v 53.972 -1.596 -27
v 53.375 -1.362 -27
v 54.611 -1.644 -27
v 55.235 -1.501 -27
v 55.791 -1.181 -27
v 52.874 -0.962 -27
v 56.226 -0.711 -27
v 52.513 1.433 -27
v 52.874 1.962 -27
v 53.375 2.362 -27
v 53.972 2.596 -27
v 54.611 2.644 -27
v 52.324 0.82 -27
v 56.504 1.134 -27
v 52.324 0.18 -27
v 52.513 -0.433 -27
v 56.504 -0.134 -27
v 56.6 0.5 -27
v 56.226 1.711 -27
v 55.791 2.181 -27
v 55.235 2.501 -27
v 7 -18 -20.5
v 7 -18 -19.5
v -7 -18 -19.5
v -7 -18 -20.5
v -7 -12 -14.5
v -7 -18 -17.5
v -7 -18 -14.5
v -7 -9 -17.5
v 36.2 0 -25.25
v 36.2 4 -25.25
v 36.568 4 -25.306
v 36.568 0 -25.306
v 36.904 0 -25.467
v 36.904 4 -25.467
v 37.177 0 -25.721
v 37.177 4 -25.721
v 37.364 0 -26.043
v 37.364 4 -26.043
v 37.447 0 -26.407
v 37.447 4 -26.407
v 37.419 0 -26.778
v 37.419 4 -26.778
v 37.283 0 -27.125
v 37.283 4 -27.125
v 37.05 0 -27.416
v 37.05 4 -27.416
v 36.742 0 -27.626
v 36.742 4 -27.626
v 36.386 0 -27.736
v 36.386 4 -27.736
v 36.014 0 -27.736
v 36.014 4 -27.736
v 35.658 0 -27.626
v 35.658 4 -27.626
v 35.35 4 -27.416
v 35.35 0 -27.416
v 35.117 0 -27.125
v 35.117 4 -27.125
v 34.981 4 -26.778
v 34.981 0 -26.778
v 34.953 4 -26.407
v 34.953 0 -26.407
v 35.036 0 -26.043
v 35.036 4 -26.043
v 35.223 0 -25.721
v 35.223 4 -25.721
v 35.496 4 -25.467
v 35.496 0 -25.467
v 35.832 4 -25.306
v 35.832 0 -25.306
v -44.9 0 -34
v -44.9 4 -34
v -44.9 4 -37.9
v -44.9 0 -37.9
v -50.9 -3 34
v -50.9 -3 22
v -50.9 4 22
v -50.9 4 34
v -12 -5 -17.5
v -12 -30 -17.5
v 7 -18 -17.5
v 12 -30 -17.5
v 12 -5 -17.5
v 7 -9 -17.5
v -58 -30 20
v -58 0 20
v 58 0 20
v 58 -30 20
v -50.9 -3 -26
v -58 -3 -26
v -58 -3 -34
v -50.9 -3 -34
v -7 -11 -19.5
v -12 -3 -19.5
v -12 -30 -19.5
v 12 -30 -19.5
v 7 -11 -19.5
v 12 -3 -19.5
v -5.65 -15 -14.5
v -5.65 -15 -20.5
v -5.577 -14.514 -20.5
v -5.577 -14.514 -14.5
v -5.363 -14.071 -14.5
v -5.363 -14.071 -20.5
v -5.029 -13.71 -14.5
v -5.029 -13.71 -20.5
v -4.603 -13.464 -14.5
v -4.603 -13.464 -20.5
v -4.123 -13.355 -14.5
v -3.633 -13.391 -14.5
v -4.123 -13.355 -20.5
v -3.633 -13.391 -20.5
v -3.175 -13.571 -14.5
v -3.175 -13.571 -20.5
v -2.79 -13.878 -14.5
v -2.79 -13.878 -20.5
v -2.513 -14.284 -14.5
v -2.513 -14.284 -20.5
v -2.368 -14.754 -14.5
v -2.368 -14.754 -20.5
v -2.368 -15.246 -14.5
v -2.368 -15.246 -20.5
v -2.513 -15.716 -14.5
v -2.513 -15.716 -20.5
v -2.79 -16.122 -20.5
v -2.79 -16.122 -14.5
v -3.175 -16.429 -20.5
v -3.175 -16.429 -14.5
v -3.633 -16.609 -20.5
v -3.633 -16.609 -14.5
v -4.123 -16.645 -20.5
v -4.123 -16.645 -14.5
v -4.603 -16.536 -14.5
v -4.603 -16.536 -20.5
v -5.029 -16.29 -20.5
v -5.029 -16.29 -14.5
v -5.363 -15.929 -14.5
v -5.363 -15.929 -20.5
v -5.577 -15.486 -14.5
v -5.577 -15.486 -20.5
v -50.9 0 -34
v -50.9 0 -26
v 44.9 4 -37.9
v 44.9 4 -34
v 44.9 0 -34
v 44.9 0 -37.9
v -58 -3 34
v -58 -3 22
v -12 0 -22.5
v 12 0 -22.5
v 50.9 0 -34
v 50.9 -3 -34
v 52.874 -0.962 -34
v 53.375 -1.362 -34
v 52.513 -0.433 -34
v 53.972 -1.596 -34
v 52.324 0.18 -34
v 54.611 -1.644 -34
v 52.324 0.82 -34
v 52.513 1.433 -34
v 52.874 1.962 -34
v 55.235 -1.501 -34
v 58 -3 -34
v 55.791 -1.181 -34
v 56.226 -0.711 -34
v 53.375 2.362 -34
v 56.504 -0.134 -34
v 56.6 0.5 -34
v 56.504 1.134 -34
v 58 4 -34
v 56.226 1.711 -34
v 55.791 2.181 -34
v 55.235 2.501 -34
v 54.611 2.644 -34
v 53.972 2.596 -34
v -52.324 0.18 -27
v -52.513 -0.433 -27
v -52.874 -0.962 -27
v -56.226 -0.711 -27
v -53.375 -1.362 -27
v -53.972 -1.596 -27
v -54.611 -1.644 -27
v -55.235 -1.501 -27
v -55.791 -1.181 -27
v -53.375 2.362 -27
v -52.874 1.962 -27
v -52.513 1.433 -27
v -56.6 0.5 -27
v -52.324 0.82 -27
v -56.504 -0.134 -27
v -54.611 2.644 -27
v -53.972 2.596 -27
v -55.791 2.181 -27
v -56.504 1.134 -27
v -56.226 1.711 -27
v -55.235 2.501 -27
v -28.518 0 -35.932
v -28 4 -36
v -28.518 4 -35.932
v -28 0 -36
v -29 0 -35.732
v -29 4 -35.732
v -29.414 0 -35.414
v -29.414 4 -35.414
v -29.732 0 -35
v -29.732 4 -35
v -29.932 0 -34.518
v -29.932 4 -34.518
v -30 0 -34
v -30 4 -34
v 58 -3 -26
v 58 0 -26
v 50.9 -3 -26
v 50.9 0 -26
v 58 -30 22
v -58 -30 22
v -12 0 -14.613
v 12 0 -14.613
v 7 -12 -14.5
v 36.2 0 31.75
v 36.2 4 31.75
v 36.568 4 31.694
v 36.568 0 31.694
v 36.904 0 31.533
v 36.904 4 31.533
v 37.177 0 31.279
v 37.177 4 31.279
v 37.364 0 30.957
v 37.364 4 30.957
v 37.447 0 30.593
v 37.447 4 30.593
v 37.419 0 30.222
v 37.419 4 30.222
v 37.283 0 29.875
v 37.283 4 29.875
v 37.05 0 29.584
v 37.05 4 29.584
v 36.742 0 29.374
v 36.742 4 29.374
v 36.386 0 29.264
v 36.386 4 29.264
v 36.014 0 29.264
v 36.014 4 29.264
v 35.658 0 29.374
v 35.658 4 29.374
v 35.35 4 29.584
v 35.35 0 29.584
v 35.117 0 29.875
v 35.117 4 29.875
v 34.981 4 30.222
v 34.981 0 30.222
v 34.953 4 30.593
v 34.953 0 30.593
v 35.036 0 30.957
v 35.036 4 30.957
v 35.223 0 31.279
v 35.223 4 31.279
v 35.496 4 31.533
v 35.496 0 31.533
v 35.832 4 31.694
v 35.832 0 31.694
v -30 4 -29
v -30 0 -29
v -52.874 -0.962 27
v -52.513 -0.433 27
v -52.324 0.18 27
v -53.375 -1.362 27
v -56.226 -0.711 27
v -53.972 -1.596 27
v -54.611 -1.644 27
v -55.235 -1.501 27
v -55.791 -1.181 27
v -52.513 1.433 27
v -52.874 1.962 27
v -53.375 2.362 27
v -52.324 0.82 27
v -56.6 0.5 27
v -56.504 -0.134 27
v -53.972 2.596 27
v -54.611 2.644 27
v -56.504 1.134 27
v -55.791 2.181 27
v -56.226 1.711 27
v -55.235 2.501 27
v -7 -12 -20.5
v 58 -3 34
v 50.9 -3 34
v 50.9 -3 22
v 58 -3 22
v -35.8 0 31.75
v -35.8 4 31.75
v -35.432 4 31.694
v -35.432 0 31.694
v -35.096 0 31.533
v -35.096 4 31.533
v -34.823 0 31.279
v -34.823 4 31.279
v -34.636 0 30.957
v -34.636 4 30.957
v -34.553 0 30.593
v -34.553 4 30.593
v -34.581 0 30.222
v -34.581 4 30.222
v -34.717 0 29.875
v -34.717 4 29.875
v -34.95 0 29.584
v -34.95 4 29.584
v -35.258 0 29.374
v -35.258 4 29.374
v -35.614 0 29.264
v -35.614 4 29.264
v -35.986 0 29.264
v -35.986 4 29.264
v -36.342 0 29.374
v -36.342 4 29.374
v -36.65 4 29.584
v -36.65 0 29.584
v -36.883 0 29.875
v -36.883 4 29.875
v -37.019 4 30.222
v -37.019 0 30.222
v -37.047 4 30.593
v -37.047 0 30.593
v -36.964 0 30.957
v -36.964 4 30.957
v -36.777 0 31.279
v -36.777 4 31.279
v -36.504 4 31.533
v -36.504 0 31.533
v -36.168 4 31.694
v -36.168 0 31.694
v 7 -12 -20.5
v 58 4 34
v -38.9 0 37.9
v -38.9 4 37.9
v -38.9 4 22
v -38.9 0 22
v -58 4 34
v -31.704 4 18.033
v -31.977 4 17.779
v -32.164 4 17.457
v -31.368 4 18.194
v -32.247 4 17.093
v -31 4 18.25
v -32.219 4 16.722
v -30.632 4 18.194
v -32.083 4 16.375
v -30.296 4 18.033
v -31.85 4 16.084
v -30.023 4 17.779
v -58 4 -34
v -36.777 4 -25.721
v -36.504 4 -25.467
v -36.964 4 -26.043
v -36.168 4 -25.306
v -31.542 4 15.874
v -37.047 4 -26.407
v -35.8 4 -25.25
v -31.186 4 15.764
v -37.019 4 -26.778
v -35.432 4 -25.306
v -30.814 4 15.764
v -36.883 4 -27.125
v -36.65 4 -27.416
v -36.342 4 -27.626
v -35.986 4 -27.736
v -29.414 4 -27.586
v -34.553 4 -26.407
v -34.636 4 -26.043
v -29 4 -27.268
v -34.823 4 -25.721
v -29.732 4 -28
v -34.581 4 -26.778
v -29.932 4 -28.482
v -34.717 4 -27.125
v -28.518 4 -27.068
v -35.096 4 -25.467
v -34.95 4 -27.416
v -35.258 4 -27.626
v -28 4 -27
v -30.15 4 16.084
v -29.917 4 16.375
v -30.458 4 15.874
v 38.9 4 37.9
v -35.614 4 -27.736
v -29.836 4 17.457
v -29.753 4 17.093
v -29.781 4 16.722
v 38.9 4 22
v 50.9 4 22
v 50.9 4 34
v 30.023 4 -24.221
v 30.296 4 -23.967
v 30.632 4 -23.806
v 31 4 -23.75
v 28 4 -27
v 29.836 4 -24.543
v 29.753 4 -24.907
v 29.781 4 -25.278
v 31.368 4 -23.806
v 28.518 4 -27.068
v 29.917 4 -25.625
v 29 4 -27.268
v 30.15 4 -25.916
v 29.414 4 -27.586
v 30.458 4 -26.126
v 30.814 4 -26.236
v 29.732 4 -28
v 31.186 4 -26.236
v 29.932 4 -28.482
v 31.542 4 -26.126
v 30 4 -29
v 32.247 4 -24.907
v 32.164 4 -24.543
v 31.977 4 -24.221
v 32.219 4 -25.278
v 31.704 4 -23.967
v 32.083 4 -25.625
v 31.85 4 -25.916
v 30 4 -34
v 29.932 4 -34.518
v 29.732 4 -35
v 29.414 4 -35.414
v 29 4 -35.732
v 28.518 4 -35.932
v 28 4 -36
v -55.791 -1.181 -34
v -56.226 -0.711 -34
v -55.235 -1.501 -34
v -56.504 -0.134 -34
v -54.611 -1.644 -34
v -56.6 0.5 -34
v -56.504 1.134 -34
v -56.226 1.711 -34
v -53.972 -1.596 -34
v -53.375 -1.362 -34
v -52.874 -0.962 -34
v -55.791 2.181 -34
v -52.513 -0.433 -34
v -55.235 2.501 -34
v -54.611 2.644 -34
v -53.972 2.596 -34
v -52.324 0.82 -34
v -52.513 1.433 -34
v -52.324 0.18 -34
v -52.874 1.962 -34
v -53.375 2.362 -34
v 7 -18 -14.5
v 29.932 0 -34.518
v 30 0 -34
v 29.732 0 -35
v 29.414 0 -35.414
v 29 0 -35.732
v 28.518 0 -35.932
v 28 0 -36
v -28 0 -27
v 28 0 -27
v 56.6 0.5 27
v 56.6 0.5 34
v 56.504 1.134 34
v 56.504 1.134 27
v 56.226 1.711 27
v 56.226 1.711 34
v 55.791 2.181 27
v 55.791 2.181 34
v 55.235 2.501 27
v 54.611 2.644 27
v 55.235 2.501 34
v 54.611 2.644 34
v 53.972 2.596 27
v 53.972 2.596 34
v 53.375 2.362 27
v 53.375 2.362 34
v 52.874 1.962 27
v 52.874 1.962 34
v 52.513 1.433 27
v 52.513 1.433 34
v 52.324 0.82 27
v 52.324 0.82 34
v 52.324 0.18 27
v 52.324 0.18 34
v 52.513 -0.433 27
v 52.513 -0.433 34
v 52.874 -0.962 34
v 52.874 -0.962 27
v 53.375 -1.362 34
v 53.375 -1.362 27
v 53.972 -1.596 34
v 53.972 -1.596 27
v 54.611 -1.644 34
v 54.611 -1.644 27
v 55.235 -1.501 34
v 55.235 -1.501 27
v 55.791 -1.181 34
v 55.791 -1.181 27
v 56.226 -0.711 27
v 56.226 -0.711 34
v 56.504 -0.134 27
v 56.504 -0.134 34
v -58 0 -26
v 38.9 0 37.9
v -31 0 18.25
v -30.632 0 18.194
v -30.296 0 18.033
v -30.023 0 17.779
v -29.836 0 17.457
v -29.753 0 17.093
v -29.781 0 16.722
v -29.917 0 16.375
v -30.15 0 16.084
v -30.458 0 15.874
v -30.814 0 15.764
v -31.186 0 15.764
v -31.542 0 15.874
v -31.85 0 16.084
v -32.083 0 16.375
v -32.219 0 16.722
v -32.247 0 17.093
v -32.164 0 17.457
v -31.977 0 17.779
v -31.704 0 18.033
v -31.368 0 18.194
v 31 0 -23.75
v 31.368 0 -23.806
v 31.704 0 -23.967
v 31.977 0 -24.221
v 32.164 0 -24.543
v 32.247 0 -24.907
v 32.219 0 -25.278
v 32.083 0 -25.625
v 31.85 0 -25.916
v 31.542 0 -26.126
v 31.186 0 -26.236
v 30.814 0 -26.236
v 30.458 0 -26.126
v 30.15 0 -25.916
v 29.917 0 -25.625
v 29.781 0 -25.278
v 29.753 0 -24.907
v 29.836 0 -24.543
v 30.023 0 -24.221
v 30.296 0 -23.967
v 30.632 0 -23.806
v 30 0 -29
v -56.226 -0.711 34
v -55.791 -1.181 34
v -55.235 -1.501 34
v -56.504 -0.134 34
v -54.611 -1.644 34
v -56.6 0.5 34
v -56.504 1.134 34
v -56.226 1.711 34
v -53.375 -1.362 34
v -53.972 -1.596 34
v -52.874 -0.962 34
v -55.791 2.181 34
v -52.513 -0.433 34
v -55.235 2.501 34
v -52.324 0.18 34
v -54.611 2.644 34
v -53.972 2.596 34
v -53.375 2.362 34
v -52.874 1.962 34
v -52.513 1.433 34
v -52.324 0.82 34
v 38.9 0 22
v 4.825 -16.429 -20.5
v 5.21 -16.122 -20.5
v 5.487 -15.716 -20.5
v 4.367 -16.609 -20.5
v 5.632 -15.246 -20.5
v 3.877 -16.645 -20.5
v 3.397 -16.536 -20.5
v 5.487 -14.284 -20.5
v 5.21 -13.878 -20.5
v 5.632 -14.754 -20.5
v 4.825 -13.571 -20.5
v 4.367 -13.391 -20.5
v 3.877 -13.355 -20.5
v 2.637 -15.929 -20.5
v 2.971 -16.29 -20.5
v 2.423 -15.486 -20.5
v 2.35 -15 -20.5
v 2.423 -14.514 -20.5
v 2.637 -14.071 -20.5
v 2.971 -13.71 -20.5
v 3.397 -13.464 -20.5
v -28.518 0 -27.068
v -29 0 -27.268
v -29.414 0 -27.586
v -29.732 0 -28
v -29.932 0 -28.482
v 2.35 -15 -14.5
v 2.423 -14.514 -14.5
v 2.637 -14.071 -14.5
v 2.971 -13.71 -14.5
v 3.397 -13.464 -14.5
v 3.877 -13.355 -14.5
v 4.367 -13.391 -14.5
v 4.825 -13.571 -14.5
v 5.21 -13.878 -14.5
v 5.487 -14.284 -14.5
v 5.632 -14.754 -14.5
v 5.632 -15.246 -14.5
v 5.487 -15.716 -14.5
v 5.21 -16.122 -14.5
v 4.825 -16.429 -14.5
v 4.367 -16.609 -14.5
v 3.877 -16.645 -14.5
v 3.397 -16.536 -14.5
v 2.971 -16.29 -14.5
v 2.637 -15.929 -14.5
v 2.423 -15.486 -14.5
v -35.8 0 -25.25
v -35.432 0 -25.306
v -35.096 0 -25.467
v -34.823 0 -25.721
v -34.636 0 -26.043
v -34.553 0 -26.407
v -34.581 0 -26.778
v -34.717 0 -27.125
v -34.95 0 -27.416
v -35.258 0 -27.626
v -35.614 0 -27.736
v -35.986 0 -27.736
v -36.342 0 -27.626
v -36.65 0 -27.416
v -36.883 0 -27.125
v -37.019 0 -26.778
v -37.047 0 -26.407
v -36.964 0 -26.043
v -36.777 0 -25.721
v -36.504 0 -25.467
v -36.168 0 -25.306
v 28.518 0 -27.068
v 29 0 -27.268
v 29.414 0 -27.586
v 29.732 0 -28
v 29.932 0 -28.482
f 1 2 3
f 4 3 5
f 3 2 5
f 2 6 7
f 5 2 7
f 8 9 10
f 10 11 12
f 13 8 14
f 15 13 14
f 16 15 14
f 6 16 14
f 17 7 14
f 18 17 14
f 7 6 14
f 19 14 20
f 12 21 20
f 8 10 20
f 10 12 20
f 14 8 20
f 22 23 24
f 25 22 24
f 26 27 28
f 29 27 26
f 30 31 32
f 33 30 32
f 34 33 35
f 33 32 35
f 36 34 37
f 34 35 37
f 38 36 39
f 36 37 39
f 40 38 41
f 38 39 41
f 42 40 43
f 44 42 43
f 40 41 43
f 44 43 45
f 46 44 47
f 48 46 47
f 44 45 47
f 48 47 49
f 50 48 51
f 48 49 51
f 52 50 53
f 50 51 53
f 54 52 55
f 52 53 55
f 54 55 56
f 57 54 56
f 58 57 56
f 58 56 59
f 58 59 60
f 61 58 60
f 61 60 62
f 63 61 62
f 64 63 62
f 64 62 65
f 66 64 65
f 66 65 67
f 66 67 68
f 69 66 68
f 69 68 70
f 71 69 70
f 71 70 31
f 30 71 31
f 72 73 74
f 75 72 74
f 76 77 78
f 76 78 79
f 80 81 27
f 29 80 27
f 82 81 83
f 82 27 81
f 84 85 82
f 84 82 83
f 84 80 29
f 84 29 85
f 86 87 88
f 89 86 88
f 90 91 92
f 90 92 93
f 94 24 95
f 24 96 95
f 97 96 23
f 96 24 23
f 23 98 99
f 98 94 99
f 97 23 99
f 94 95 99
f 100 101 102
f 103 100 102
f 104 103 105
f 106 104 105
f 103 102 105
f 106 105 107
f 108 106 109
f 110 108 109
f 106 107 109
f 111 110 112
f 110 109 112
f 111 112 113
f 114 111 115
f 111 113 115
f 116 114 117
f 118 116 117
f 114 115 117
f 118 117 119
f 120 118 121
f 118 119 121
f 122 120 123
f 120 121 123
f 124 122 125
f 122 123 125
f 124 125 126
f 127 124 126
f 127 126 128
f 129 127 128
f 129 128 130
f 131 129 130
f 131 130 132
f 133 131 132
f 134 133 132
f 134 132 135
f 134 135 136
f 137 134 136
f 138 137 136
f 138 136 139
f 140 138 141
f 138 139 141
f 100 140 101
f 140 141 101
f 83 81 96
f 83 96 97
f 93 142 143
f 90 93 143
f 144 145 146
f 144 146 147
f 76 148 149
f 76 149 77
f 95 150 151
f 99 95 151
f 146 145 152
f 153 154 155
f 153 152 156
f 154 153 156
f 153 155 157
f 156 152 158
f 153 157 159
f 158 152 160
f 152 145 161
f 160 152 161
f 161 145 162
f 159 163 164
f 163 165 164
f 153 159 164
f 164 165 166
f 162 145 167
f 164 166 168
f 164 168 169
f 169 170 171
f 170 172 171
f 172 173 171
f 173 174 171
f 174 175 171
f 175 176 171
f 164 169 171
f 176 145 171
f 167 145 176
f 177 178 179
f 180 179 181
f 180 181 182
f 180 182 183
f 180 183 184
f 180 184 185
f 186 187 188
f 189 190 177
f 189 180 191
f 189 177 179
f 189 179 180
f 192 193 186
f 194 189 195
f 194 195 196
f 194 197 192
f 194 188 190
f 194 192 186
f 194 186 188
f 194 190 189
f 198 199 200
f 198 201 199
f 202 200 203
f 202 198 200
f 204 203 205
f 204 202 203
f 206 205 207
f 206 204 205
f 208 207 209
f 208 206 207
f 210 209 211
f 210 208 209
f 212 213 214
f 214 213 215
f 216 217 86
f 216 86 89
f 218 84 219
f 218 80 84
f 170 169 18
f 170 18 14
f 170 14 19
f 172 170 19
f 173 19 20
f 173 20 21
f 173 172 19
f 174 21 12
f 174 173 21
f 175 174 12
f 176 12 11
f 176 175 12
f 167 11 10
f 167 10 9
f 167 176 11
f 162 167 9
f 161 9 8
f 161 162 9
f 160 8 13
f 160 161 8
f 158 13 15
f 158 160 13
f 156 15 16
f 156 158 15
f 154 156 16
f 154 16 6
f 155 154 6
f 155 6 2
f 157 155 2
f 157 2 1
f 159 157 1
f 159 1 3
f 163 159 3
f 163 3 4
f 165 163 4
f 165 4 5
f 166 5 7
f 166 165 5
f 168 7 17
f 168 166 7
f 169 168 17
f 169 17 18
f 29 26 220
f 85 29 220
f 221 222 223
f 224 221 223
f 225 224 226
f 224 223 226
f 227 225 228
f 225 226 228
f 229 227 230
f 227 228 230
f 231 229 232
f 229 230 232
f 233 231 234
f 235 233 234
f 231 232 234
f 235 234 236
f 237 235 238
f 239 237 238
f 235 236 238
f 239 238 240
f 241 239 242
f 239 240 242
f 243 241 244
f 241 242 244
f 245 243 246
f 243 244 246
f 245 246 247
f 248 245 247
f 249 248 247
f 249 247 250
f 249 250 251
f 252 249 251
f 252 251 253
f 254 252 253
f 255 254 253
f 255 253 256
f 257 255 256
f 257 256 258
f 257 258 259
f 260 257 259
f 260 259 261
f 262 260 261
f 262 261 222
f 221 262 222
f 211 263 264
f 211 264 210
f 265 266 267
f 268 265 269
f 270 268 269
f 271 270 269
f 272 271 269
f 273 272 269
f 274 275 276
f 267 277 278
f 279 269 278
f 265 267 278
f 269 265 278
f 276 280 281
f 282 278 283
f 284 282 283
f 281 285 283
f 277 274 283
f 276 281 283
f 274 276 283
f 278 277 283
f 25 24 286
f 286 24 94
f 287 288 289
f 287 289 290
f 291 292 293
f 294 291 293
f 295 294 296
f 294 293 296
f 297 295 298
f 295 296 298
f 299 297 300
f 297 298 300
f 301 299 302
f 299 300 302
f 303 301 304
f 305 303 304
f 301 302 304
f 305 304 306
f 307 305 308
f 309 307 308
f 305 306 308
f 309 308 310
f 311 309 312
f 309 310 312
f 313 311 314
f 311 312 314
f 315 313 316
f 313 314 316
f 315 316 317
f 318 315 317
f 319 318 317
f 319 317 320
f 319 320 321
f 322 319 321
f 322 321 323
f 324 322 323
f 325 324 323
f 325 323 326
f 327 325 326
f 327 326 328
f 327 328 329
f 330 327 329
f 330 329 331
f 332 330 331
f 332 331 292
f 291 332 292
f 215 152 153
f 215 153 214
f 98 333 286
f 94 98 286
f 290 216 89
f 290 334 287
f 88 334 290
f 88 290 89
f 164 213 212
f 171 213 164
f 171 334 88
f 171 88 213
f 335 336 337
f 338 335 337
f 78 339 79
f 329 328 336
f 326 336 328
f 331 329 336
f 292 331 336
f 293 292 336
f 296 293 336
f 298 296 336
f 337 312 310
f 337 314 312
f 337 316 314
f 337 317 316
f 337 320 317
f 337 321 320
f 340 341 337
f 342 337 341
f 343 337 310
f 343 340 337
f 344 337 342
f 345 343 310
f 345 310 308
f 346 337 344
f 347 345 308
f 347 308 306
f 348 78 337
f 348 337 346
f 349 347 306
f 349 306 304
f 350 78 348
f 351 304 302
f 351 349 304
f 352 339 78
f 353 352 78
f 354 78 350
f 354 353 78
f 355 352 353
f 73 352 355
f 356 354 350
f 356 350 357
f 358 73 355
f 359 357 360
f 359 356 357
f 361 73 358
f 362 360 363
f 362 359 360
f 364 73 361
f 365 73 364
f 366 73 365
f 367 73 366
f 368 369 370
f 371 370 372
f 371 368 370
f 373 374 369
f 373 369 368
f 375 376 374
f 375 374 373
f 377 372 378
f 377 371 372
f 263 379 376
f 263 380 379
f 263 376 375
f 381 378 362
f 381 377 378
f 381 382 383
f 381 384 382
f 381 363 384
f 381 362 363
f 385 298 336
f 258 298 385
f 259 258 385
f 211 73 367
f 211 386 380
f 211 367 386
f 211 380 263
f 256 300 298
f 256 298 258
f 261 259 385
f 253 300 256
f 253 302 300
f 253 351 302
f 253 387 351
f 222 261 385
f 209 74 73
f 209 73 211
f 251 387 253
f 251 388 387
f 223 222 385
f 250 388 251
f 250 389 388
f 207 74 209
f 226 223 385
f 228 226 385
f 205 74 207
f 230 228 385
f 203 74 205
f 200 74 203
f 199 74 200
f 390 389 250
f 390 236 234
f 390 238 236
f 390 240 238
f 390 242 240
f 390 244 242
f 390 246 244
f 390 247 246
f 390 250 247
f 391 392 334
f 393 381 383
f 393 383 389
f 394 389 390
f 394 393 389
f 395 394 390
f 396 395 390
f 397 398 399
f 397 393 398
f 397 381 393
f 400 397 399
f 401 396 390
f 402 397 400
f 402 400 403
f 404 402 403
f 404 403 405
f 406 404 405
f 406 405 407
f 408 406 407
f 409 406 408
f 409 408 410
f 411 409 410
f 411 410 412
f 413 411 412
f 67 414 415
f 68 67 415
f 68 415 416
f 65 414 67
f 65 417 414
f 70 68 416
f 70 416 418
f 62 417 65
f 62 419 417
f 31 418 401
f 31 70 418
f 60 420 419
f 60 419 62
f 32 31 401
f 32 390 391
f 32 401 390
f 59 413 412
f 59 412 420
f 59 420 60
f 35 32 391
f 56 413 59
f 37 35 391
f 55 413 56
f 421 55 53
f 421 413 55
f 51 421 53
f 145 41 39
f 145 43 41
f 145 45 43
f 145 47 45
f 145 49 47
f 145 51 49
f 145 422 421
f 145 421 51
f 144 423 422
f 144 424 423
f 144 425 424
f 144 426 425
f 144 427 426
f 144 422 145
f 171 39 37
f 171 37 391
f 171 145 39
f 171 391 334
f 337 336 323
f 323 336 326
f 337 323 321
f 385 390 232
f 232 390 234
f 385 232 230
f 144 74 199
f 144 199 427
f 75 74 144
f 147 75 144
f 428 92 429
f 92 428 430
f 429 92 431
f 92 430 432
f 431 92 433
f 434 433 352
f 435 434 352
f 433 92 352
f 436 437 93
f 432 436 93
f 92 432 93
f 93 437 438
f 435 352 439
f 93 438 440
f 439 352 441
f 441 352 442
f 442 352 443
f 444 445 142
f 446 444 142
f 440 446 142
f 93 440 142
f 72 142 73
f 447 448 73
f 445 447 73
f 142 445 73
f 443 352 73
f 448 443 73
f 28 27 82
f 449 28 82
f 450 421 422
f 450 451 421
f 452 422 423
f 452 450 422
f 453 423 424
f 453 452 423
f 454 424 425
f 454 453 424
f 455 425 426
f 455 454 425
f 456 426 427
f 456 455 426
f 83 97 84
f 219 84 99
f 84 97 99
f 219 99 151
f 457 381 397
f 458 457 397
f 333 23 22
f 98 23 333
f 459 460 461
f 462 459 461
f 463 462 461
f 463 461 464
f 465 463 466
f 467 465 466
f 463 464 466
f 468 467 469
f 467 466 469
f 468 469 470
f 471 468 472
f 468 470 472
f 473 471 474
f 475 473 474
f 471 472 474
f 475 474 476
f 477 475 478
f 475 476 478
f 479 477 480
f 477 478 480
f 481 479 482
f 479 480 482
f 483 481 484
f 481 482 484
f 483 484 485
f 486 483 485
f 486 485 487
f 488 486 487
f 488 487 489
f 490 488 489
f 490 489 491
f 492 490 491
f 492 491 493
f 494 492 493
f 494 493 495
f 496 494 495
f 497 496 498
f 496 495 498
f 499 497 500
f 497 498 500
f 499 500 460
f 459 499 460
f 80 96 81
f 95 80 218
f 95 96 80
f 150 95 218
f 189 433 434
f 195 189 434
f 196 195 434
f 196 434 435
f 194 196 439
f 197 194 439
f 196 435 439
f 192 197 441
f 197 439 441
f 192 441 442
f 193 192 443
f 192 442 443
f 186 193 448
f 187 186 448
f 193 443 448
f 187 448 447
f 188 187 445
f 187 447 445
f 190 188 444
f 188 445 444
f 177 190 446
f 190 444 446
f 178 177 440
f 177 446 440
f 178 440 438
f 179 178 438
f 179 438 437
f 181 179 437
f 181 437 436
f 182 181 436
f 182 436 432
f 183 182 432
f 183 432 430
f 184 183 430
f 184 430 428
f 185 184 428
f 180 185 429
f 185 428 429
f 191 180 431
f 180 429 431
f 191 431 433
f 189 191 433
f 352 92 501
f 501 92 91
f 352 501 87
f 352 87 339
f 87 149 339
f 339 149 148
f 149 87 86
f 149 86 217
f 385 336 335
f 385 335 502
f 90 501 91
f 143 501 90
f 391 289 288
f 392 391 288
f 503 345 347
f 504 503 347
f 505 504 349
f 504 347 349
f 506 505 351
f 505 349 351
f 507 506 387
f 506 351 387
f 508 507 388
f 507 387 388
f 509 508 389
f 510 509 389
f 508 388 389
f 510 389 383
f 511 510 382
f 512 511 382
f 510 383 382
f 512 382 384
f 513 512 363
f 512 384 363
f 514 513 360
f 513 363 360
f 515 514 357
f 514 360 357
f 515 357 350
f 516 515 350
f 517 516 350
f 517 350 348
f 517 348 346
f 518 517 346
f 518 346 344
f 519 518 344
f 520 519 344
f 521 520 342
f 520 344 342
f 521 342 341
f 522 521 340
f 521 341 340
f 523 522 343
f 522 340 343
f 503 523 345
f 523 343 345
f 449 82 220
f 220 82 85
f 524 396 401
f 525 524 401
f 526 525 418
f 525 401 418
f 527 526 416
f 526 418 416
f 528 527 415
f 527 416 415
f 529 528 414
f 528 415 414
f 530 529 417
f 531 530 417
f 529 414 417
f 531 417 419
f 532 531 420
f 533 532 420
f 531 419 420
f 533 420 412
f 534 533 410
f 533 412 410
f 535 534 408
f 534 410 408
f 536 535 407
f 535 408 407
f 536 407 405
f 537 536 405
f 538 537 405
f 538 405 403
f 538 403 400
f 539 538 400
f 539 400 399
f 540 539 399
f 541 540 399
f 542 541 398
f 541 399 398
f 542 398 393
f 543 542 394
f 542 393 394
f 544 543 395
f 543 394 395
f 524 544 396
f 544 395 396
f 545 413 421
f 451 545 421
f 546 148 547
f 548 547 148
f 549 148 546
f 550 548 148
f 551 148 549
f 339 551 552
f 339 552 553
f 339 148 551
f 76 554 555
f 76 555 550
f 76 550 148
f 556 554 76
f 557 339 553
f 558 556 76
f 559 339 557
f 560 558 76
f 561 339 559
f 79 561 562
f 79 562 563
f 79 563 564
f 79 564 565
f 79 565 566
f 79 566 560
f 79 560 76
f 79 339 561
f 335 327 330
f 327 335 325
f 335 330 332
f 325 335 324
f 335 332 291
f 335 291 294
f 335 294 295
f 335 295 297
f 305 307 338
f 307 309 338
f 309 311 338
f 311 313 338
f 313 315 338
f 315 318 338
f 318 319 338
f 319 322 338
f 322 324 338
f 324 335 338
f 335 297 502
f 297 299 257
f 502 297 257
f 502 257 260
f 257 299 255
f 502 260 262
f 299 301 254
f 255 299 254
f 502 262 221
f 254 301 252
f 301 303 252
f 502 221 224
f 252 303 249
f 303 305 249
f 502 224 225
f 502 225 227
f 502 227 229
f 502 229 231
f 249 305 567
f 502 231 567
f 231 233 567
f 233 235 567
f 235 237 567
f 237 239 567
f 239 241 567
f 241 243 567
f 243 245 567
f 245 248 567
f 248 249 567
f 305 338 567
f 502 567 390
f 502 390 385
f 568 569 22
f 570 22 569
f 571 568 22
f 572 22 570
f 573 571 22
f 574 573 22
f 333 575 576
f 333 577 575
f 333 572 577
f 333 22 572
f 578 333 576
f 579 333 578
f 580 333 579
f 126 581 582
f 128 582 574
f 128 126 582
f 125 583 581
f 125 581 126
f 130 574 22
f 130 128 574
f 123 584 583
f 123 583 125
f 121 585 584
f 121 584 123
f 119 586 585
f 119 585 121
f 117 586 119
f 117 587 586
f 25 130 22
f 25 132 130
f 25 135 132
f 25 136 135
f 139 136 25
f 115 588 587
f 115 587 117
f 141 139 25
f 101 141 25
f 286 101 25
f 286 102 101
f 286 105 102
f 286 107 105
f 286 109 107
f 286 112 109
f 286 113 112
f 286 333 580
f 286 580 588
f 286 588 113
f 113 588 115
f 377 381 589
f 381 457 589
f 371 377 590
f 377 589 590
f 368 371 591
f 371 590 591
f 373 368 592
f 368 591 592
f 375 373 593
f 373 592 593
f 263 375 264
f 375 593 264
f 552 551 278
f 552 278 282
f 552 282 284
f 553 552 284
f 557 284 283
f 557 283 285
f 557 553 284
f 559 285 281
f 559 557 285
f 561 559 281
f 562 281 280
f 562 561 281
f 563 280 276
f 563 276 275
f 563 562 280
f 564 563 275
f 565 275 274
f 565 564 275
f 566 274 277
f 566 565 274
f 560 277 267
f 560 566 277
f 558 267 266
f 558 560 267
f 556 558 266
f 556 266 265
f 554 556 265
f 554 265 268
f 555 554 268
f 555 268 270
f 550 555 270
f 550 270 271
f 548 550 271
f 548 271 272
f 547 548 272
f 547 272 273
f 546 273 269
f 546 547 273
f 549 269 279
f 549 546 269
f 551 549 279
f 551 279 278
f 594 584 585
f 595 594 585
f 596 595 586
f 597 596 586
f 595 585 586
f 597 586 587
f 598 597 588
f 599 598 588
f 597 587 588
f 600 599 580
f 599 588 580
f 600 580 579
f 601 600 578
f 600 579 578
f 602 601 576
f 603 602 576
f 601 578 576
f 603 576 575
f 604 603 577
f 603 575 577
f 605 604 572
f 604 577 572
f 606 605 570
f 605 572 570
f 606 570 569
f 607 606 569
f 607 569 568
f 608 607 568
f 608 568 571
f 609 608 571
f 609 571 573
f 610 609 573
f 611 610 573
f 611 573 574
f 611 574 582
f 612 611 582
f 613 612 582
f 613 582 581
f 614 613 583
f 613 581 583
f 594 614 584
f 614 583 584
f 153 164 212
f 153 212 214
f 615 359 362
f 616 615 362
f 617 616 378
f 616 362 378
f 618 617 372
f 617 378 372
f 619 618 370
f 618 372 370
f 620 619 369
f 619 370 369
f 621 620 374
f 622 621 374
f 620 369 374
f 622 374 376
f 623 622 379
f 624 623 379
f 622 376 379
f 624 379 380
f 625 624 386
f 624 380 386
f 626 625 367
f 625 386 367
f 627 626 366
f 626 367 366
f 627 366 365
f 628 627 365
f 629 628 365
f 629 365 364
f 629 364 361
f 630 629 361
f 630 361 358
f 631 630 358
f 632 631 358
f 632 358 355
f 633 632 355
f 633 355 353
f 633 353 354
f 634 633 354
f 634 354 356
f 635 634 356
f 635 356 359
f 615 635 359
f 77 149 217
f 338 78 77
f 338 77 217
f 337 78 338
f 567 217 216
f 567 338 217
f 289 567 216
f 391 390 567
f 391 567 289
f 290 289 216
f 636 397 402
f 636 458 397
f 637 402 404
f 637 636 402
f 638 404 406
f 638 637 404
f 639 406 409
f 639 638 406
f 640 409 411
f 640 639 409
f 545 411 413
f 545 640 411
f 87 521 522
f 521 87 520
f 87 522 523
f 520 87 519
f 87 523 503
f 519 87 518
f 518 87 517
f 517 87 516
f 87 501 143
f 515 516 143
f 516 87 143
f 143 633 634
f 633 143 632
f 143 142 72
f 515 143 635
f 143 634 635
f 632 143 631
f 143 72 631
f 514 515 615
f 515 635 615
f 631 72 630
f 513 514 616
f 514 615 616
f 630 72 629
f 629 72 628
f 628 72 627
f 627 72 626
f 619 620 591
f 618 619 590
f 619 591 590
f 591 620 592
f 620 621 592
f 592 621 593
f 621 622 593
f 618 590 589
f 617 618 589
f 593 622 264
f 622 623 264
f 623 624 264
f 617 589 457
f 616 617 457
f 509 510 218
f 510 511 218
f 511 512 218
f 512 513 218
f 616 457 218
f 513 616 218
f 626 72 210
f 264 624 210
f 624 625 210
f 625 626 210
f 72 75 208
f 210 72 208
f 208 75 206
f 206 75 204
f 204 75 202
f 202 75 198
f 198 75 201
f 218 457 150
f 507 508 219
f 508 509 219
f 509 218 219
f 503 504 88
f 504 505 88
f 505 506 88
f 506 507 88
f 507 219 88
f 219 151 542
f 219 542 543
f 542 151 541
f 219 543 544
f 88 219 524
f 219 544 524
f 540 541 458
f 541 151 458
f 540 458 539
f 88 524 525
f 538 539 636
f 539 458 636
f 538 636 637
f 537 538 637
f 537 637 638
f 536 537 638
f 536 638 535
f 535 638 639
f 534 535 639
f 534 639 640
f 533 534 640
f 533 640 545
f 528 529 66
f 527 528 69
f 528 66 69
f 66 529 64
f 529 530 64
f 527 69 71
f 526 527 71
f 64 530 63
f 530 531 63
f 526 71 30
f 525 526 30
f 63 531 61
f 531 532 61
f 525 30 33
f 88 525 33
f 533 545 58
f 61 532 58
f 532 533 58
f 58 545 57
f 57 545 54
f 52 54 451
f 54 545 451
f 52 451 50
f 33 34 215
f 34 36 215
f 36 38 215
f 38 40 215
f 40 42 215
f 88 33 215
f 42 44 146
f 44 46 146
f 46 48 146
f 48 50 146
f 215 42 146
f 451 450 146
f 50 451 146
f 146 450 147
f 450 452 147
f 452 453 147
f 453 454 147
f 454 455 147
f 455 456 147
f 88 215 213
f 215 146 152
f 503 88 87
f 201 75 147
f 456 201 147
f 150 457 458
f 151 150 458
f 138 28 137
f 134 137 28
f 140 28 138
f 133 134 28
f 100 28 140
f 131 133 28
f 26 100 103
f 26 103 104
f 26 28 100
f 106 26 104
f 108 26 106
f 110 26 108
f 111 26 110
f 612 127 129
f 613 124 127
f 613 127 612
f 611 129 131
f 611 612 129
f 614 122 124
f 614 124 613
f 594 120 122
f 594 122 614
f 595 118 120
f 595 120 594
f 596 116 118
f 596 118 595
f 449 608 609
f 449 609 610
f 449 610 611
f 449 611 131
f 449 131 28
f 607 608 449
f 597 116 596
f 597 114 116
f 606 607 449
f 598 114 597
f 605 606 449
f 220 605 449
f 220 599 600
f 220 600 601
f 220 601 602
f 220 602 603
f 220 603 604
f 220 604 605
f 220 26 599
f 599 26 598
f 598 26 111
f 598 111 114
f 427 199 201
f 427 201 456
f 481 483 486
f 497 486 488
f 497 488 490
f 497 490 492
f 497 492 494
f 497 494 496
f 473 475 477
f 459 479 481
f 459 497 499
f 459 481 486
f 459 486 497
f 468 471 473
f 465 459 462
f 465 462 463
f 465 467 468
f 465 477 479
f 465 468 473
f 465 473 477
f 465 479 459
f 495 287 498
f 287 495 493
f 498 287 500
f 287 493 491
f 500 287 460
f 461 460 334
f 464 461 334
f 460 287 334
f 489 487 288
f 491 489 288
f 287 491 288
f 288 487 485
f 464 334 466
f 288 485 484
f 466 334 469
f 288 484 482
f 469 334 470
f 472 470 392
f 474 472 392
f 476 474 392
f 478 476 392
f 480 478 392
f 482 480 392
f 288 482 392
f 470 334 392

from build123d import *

# Parameters (mm, degrees)
BOSS_EXTRUDE1_DEPTH             = 4
SKETCH3_W                       = 7.1
SKETCH3_H                       = 8
BOSS_EXTRUDE3_DEPTH             = 3
SKETCH4_R                       = 2.15
CUT_EXTRUDE1_DEPTH              = 7
MIRROR2_COPY_1_SKETCH_W         = 7.1
MIRROR2_COPY_1_SKETCH_H         = 8
MIRROR2_COPY_1_DEPTH            = 3
MIRROR2_COPY_2_SKETCH_R         = 2.15
MIRROR2_COPY_2_DEPTH            = 7
SKETCH5_W                       = 60
SKETCH5_H                       = 9
CUT_EXTRUDE2_DEPTH              = 72.37226352
FILLET1_R                       = 2
SKETCH7_W                       = 101.8
SKETCH7_H                       = 1
CUT_EXTRUDE3_DEPTH              = 72.37226352
SKETCH8_W                       = 116
SKETCH8_H                       = 2
BOSS_EXTRUDE4_DEPTH             = 30
SKETCH9_W                       = 12
SKETCH9_H                       = 18
CUT_EXTRUDE4_DEPTH              = 10
SKETCH10_W                      = 7.1
SKETCH10_H                      = 4
BOSS_EXTRUDE5_DEPTH             = 3
SKETCH12_W                      = 1.5
SKETCH12_H                      = 4
BOSS_EXTRUDE6_DEPTH             = 2
SKETCH13_W                      = 36
SKETCH13_H                      = 2
BOSS_EXTRUDE7_DEPTH             = 30
SKETCH14_W                      = 1.5
SKETCH14_H                      = 4
BOSS_EXTRUDE8_DEPTH             = 1
BOSS_EXTRUDE9_REACH             = 79.055
BOSS_EXTRUDE9_DIRECTION_2_REACH = 79.055
SKETCH16_W                      = 20
SKETCH16_H                      = 28
SKETCH16_W_2                    = 14.6
SKETCH16_H_2                    = 9.2
BOSS_EXTRUDE10_DEPTH            = 2.6
SKETCH17_W                      = 12
SKETCH17_H                      = 18
CUT_EXTRUDE5_DEPTH              = 78.054785705
SKETCH18_W                      = 6
SKETCH18_H                      = 6
CUT_EXTRUDE6_DEPTH              = 79.759380394
SKETCH22_R                      = 1.25
CUT_EXTRUDE7_DEPTH              = 4
SKETCH25_W                      = 6
SKETCH25_H                      = 30
CUT_EXTRUDE11_DEPTH             = 10
CUT_EXTRUDE12_DEPTH             = 78.810282097
CUT_EXTRUDE12_DEPTH_BACK        = 78.810282097
SKETCH26_W                      = 6.843369225
SKETCH26_H                      = 31.263319976
SKETCH26_W_2                    = 6.53419365
SKETCH26_H_2                    = 28.524331859
SKETCH27_R                      = 1.25
CUT_EXTRUDE13_DEPTH             = 79.230428862
SKETCH28_W                      = 89.8
SKETCH28_H                      = 0.6
SKETCH28_W_2                    = 77.8
CUT_EXTRUDE14_DEPTH             = 79.230428862
CHAMFER1_SIZE                   = 2
SKETCH29_W                      = 20
SKETCH29_H                      = 28
CUT_EXTRUDE15_DEPTH             = 17.4
CUT_EXTRUDE16_DEPTH             = 2
SKETCH30_W                      = 89.8
SKETCH30_H                      = 1.5
SKETCH30_W_2                    = 77.8
CUT_EXTRUDE17_DEPTH             = 78.925348892
SKETCH32_W                      = 14
SKETCH32_H                      = 6
BOSS_EXTRUDE11_DEPTH            = 1
CHAMFER2_SIZE                   = 1
SKETCH34_W                      = 14
SKETCH34_H                      = 6
BOSS_EXTRUDE12_DEPTH            = 3
CHAMFER3_SIZE                   = 3
SKETCH33_R                      = 1.65
CUT_EXTRUDE18_DEPTH             = 6
CHAMFER4_SIZE                   = 3


with BuildPart() as part:
    # Sketch1 → Boss-Extrude1 (new body)
    with BuildSketch(Plane(origin=(0, 0, 0), x_dir=(1, 0, 0), z_dir=(0, 1, 0))):
        Polygon((-58, -34), (-50.9, -34), (-50.9, -41), (50.9, -41), (50.9, -34), (58, -34), (58, 34), (50.9, 34), (50.9, 41), (-50.9, 41), (-50.9, 34), (-58, 34), align=None)
    extrude(amount=BOSS_EXTRUDE1_DEPTH)

    # Sketch3 → Boss-Extrude3 (add)
    with BuildSketch(Plane.XZ):
        with Locations((-54.45, -30)):
            Rectangle(SKETCH3_W, SKETCH3_H)
    boss_extrude3 = extrude(amount=BOSS_EXTRUDE3_DEPTH)

    # Sketch4 → Cut-Extrude1 (cut)
    with BuildSketch(Plane(origin=(0, 0, -34), x_dir=(-1, 0, 0), z_dir=(0, 0, -1))):
        with Locations((54.45, 0.5)):
            Circle(SKETCH4_R)
    cut_extrude1 = extrude(amount=-CUT_EXTRUDE1_DEPTH, mode=Mode.SUBTRACT)

    # Mirror1: Boss-Extrude3, Cut-Extrude1 across plane
    add(boss_extrude3.mirror(Plane(origin=(0, 0, 0), x_dir=(0, 0, 1), z_dir=(1, 0, 0))))
    add(cut_extrude1.mirror(Plane(origin=(0, 0, 0), x_dir=(0, 0, 1), z_dir=(1, 0, 0))), mode=Mode.SUBTRACT)

    # Mirror2: Boss-Extrude3, Cut-Extrude1 across plane
    add(boss_extrude3.mirror(Plane.XY))
    add(cut_extrude1.mirror(Plane.XY), mode=Mode.SUBTRACT)

    # Mirror2 copy 1 sketch → Mirror2 copy 1 (add)
    with BuildSketch(Plane(origin=(0, 0, 0), x_dir=(-1, 0, 0), z_dir=(0, -1, 0))):
        with Locations((-54.45, -30)):
            Rectangle(MIRROR2_COPY_1_SKETCH_W, MIRROR2_COPY_1_SKETCH_H)
    extrude(amount=MIRROR2_COPY_1_DEPTH)

    # Mirror2 copy 2 sketch → Mirror2 copy 2 (cut)
    with BuildSketch(Plane.XY.offset(34)):
        with Locations((54.45, 0.5)):
            Circle(MIRROR2_COPY_2_SKETCH_R)
    extrude(amount=-MIRROR2_COPY_2_DEPTH, mode=Mode.SUBTRACT)

    # Sketch5 → Cut-Extrude2 (cut, through all)
    with BuildSketch(Plane(origin=(0, 4, 0), x_dir=(1, 0, 0), z_dir=(0, 1, 0))):
        with Locations((0, 31.5)):
            Rectangle(SKETCH5_W, SKETCH5_H)
    extrude(amount=-CUT_EXTRUDE2_DEPTH, mode=Mode.SUBTRACT)

    # Fillet1
    fillet1_edges = [part.edges().sort_by_distance(p)[0] for p in [
        (-30, 2, -27),
        (-30, 2, -36),
        (30, 2, -36),
        (30, 2, -27),
    ]]
    fillet(fillet1_edges, radius=FILLET1_R)

    # Sketch7 → Cut-Extrude3 (cut, through all)
    with BuildSketch(Plane(origin=(0, 4, 0), x_dir=(1, 0, 0), z_dir=(0, 1, 0))):
        with Locations((0, 40.5)):
            Rectangle(SKETCH7_W, SKETCH7_H)
        with Locations((0, -40.5)):
            Rectangle(SKETCH7_W, SKETCH7_H)
    extrude(amount=-CUT_EXTRUDE3_DEPTH, mode=Mode.SUBTRACT)

    # Sketch8 → Boss-Extrude4 (add)
    with BuildSketch(Plane.XZ):
        with Locations((0, 21)):
            Rectangle(SKETCH8_W, SKETCH8_H)
    extrude(amount=BOSS_EXTRUDE4_DEPTH)

    # Sketch9 → Cut-Extrude4 (cut)
    with BuildSketch(Plane(origin=(0, 4, 0), x_dir=(1, 0, 0), z_dir=(0, 1, 0))):
        with Locations((-44.9, -31)):
            Rectangle(SKETCH9_W, SKETCH9_H)
    extrude(amount=-CUT_EXTRUDE4_DEPTH, mode=Mode.SUBTRACT)

    # Sketch10 → Boss-Extrude5 (add)
    with BuildSketch(Plane.XZ.offset(3)):
        with Locations((-54.45, 24)):
            Rectangle(SKETCH10_W, SKETCH10_H)
        with Locations((54.45, 24)):
            Rectangle(SKETCH10_W, SKETCH10_H)
    extrude(amount=-BOSS_EXTRUDE5_DEPTH)

    # Sketch12 → Boss-Extrude6 (add)
    # profile 1 of 2: a face of its own
    with BuildSketch(Plane.ZY.offset(51)):
        Polygon((22, -5.8), (22, -16.2), (24.7, -13.5), (24.7, -8.5), align=None)
        with Locations((23.35, -11)):
            Rectangle(SKETCH12_W, SKETCH12_H, mode=Mode.SUBTRACT)
    # profile 2 of 2: a face of its own
    with BuildSketch(Plane.ZY.offset(51)):
        Polygon((22, -20.8), (22, -31.2), (24.7, -28.5), (24.7, -23.5), align=None)
        with Locations((23.35, -26)):
            Rectangle(SKETCH12_W, SKETCH12_H, mode=Mode.SUBTRACT)
    boss_extrude6 = extrude(amount=-BOSS_EXTRUDE6_DEPTH)

    # Mirror3: Boss-Extrude6 across plane
    add(boss_extrude6.mirror(Plane(origin=(-44.9, 0, 0), x_dir=(0, 0, 1), z_dir=(1, 0, 0))))

    # Sketch13 → Boss-Extrude7 (add)
    with BuildSketch(Plane.XZ):
        with Locations((0, -18.5)):
            Rectangle(SKETCH13_W, SKETCH13_H)
    extrude(amount=BOSS_EXTRUDE7_DEPTH)

    # Boss-Extrude9: up to this face of the body (flat: up to its plane)
    boss_extrude9_end = Plane(part.part.faces().sort_by_distance((-18, -15, -18.5))[0])
    # Sketch15 → Boss-Extrude9 (add, up to the picked face)
    with BuildSketch(Plane(origin=(0, 0, 0), x_dir=(0, 0, -1), z_dir=(1, 0, 0)), mode=Mode.PRIVATE) as boss_extrude9_sk1:
        Polygon((17.5, 0), (17.5, -5), (14.613248654, 0), align=None)
    boss_extrude9_tool1 = split(extrude(boss_extrude9_sk1.sketch, amount=-BOSS_EXTRUDE9_REACH, mode=Mode.PRIVATE), bisect_by=boss_extrude9_end, keep=Keep.BOTH, mode=Mode.PRIVATE)
    add(boss_extrude9_tool1.solids().sort_by(Axis((0, -1.666667, -16.53775), (-1, 0, 0)))[0])

    # Boss-Extrude9 direction 2: up to this face of the body (flat: up to its plane)
    boss_extrude9_direction_2_end = Plane(part.part.faces().sort_by_distance((18, -15, -18.5))[0])
    # Sketch15 → Boss-Extrude9 direction 2 (add, up to the picked face)
    with BuildSketch(Plane(origin=(0, 0, 0), x_dir=(0, 0, -1), z_dir=(1, 0, 0)), mode=Mode.PRIVATE) as boss_extrude9_direction_2_sk1:
        Polygon((17.5, 0), (17.5, -5), (14.613248654, 0), align=None)
    boss_extrude9_direction_2_tool1 = split(extrude(boss_extrude9_direction_2_sk1.sketch, amount=BOSS_EXTRUDE9_DIRECTION_2_REACH, mode=Mode.PRIVATE), bisect_by=boss_extrude9_direction_2_end, keep=Keep.BOTH, mode=Mode.PRIVATE)
    add(boss_extrude9_direction_2_tool1.solids().sort_by(Axis((0, -1.666667, -16.53775), (1, 0, 0)))[0])

    # Sketch16 → Boss-Extrude10 (add)
    with BuildSketch(Plane.XY.offset(40)):
        with Locations((28, -14)):
            Rectangle(SKETCH16_W, SKETCH16_H)
        with Locations((28, -20.4)):
            Rectangle(SKETCH16_W_2, SKETCH16_H_2, mode=Mode.SUBTRACT)
    extrude(amount=-BOSS_EXTRUDE10_DEPTH)

    # Sketch17 → Cut-Extrude5 (cut, through all)
    with BuildSketch(Plane.XZ):
        with Locations((44.9, 31)):
            Rectangle(SKETCH17_W, SKETCH17_H)
    extrude(amount=-CUT_EXTRUDE5_DEPTH, mode=Mode.SUBTRACT)

    # Sketch18 → Cut-Extrude6 (cut, through all)
    with BuildSketch(Plane(origin=(0, 4, 0), x_dir=(1, 0, 0), z_dir=(0, 1, 0))):
        with Locations((47.9, 37)):
            Rectangle(SKETCH18_W, SKETCH18_H)
        with Locations((-47.9, 37)):
            Rectangle(SKETCH18_W, SKETCH18_H)
    extrude(amount=-CUT_EXTRUDE6_DEPTH, mode=Mode.SUBTRACT)

    # Sketch22 → Cut-Extrude7 (cut)
    with BuildSketch(Plane(origin=(0, 4, 0), x_dir=(1, 0, 0), z_dir=(0, 1, 0))):
        with Locations(Location((31, 25, 0), (0, 0, 270))):
            Circle(SKETCH22_R)
        with Locations(Location((-31, -17, 0), (0, 0, 270))):
            Circle(SKETCH22_R)
    extrude(amount=-CUT_EXTRUDE7_DEPTH, mode=Mode.SUBTRACT)

    # Sketch25 → Cut-Extrude11 (cut)
    with BuildSketch(Plane(origin=(0, 0, -19.5), x_dir=(-1, 0, 0), z_dir=(0, 0, -1))):
        with Locations((-15, -15)):
            Rectangle(SKETCH25_W, SKETCH25_H)
        with Locations((15, -15)):
            Rectangle(SKETCH25_W, SKETCH25_H)
    extrude(amount=-CUT_EXTRUDE11_DEPTH, mode=Mode.SUBTRACT)

    # Sketch26 → Cut-Extrude12 (cut, two sides: drawn at the far end of the back side and taken through both)
    with BuildSketch(Plane.ZY.offset(1).offset(-CUT_EXTRUDE12_DEPTH_BACK)):
        with Locations((-23.779868126, -20.73082856)):
            Rectangle(SKETCH26_W, SKETCH26_H)
        with Locations((25.267096825, -20.06216593)):
            Rectangle(SKETCH26_W_2, SKETCH26_H_2)
    extrude(amount=CUT_EXTRUDE12_DEPTH + CUT_EXTRUDE12_DEPTH_BACK, mode=Mode.SUBTRACT)

    # Sketch27 → Cut-Extrude13 (cut, through all)
    with BuildSketch(Plane(origin=(0, 4, 0), x_dir=(1, 0, 0), z_dir=(0, 1, 0))):
        with Locations(Location((-35.8, 26.5, 0), (0, 0, 270))):
            Circle(SKETCH27_R)
        with Locations(Location((-35.8, -30.5, 0), (0, 0, 270))):
            Circle(SKETCH27_R)
        with Locations(Location((36.2, -30.5, 0), (0, 0, 270))):
            Circle(SKETCH27_R)
        with Locations(Location((36.2, 26.5, 0), (0, 0, 270))):
            Circle(SKETCH27_R)
    extrude(amount=-CUT_EXTRUDE13_DEPTH, mode=Mode.SUBTRACT)

    # Sketch28 → Cut-Extrude14 (cut, through all)
    with BuildSketch(Plane(origin=(0, 4, 0), x_dir=(1, 0, 0), z_dir=(0, 1, 0))):
        with Locations((0, 39.7)):
            Rectangle(SKETCH28_W, SKETCH28_H)
        with Locations((0, -39.7)):
            Rectangle(SKETCH28_W_2, SKETCH28_H)
    extrude(amount=-CUT_EXTRUDE14_DEPTH, mode=Mode.SUBTRACT)

    # Chamfer1
    chamfer1_edges = [part.edges().sort_by_distance(p)[0] for p in [
        (28, 0, 37.4),
    ]]
    chamfer(chamfer1_edges, length=CHAMFER1_SIZE)

    # Sketch29 → Cut-Extrude15 (cut)
    with BuildSketch(Plane.XY.offset(39.4)):
        with Locations((28, -14)):
            Rectangle(SKETCH29_W, SKETCH29_H)
    extrude(amount=-CUT_EXTRUDE15_DEPTH, mode=Mode.SUBTRACT)

    # Sketch30 → Cut-Extrude17 (cut, through all)
    with BuildSketch(Plane(origin=(0, 4, 0), x_dir=(1, 0, 0), z_dir=(0, 1, 0))):
        with Locations((0, 38.65)):
            Rectangle(SKETCH30_W, SKETCH30_H)
        with Locations((0, -38.65)):
            Rectangle(SKETCH30_W_2, SKETCH30_H)
    extrude(amount=-CUT_EXTRUDE17_DEPTH, mode=Mode.SUBTRACT)

    # Sketch32 → Boss-Extrude11 (add)
    with BuildSketch(Plane(origin=(0, 0, -19.5), x_dir=(-1, 0, 0), z_dir=(0, 0, -1))):
        with Locations((0, -15)):
            Rectangle(SKETCH32_W, SKETCH32_H)
    extrude(amount=BOSS_EXTRUDE11_DEPTH)

    # Chamfer2
    chamfer2_edges = [part.edges().sort_by_distance(p)[0] for p in [
        (0, -12, -19.5),
    ]]
    chamfer(chamfer2_edges, length=CHAMFER2_SIZE - 0.0001)  # a hair under: the kernel refuses the full size

    # Sketch34 → Boss-Extrude12 (add)
    with BuildSketch(Plane.XY.offset(-17.5)):
        with Locations((0, -15)):
            Rectangle(SKETCH34_W, SKETCH34_H)
    extrude(amount=BOSS_EXTRUDE12_DEPTH)

    # Chamfer3
    chamfer3_edges = [part.edges().sort_by_distance(p)[0] for p in [
        (0, -12, -17.5),
    ]]
    chamfer(chamfer3_edges, length=CHAMFER3_SIZE - 0.0001)  # a hair under: the kernel refuses the full size

    # Sketch33 → Cut-Extrude18 (cut)
    with BuildSketch(Plane(origin=(0, 0, -20.5), x_dir=(-1, 0, 0), z_dir=(0, 0, -1))):
        with Locations((4, -15)):
            Circle(SKETCH33_R)
        with Locations((-4, -15)):
            Circle(SKETCH33_R)
    extrude(amount=-CUT_EXTRUDE18_DEPTH, mode=Mode.SUBTRACT)

    # Chamfer4
    chamfer4_edges = [part.edges().sort_by_distance(p)[0] for p in [
        (0, 0, -19.5),
    ]]
    chamfer(chamfer4_edges, length=CHAMFER4_SIZE)


with BuildPart() as body_2:
    # Sketch14 → Boss-Extrude8 (new, symmetric)
    with BuildSketch(Plane(origin=(0, 0, 0), x_dir=(0, 0, -1), z_dir=(1, 0, 0))):
        Polygon((24.2, -8.5), (21.5, -5.8), (21.5, -16.2), (24.2, -13.5), align=None)
        with Locations((22.85, -11)):
            Rectangle(SKETCH14_W, SKETCH14_H, mode=Mode.SUBTRACT)
    extrude(amount=BOSS_EXTRUDE8_DEPTH, both=True)

    # Sketch31 → Cut-Extrude16 (cut)
    with BuildSketch(Plane.ZY.offset(1)):
        Polygon((-24.2, -8.5), (-24.2, -13.5), (-21.5, -16.2), (-21.5, -5.8), align=None)
    extrude(amount=-CUT_EXTRUDE16_DEPTH, mode=Mode.SUBTRACT)


solid = part.part
